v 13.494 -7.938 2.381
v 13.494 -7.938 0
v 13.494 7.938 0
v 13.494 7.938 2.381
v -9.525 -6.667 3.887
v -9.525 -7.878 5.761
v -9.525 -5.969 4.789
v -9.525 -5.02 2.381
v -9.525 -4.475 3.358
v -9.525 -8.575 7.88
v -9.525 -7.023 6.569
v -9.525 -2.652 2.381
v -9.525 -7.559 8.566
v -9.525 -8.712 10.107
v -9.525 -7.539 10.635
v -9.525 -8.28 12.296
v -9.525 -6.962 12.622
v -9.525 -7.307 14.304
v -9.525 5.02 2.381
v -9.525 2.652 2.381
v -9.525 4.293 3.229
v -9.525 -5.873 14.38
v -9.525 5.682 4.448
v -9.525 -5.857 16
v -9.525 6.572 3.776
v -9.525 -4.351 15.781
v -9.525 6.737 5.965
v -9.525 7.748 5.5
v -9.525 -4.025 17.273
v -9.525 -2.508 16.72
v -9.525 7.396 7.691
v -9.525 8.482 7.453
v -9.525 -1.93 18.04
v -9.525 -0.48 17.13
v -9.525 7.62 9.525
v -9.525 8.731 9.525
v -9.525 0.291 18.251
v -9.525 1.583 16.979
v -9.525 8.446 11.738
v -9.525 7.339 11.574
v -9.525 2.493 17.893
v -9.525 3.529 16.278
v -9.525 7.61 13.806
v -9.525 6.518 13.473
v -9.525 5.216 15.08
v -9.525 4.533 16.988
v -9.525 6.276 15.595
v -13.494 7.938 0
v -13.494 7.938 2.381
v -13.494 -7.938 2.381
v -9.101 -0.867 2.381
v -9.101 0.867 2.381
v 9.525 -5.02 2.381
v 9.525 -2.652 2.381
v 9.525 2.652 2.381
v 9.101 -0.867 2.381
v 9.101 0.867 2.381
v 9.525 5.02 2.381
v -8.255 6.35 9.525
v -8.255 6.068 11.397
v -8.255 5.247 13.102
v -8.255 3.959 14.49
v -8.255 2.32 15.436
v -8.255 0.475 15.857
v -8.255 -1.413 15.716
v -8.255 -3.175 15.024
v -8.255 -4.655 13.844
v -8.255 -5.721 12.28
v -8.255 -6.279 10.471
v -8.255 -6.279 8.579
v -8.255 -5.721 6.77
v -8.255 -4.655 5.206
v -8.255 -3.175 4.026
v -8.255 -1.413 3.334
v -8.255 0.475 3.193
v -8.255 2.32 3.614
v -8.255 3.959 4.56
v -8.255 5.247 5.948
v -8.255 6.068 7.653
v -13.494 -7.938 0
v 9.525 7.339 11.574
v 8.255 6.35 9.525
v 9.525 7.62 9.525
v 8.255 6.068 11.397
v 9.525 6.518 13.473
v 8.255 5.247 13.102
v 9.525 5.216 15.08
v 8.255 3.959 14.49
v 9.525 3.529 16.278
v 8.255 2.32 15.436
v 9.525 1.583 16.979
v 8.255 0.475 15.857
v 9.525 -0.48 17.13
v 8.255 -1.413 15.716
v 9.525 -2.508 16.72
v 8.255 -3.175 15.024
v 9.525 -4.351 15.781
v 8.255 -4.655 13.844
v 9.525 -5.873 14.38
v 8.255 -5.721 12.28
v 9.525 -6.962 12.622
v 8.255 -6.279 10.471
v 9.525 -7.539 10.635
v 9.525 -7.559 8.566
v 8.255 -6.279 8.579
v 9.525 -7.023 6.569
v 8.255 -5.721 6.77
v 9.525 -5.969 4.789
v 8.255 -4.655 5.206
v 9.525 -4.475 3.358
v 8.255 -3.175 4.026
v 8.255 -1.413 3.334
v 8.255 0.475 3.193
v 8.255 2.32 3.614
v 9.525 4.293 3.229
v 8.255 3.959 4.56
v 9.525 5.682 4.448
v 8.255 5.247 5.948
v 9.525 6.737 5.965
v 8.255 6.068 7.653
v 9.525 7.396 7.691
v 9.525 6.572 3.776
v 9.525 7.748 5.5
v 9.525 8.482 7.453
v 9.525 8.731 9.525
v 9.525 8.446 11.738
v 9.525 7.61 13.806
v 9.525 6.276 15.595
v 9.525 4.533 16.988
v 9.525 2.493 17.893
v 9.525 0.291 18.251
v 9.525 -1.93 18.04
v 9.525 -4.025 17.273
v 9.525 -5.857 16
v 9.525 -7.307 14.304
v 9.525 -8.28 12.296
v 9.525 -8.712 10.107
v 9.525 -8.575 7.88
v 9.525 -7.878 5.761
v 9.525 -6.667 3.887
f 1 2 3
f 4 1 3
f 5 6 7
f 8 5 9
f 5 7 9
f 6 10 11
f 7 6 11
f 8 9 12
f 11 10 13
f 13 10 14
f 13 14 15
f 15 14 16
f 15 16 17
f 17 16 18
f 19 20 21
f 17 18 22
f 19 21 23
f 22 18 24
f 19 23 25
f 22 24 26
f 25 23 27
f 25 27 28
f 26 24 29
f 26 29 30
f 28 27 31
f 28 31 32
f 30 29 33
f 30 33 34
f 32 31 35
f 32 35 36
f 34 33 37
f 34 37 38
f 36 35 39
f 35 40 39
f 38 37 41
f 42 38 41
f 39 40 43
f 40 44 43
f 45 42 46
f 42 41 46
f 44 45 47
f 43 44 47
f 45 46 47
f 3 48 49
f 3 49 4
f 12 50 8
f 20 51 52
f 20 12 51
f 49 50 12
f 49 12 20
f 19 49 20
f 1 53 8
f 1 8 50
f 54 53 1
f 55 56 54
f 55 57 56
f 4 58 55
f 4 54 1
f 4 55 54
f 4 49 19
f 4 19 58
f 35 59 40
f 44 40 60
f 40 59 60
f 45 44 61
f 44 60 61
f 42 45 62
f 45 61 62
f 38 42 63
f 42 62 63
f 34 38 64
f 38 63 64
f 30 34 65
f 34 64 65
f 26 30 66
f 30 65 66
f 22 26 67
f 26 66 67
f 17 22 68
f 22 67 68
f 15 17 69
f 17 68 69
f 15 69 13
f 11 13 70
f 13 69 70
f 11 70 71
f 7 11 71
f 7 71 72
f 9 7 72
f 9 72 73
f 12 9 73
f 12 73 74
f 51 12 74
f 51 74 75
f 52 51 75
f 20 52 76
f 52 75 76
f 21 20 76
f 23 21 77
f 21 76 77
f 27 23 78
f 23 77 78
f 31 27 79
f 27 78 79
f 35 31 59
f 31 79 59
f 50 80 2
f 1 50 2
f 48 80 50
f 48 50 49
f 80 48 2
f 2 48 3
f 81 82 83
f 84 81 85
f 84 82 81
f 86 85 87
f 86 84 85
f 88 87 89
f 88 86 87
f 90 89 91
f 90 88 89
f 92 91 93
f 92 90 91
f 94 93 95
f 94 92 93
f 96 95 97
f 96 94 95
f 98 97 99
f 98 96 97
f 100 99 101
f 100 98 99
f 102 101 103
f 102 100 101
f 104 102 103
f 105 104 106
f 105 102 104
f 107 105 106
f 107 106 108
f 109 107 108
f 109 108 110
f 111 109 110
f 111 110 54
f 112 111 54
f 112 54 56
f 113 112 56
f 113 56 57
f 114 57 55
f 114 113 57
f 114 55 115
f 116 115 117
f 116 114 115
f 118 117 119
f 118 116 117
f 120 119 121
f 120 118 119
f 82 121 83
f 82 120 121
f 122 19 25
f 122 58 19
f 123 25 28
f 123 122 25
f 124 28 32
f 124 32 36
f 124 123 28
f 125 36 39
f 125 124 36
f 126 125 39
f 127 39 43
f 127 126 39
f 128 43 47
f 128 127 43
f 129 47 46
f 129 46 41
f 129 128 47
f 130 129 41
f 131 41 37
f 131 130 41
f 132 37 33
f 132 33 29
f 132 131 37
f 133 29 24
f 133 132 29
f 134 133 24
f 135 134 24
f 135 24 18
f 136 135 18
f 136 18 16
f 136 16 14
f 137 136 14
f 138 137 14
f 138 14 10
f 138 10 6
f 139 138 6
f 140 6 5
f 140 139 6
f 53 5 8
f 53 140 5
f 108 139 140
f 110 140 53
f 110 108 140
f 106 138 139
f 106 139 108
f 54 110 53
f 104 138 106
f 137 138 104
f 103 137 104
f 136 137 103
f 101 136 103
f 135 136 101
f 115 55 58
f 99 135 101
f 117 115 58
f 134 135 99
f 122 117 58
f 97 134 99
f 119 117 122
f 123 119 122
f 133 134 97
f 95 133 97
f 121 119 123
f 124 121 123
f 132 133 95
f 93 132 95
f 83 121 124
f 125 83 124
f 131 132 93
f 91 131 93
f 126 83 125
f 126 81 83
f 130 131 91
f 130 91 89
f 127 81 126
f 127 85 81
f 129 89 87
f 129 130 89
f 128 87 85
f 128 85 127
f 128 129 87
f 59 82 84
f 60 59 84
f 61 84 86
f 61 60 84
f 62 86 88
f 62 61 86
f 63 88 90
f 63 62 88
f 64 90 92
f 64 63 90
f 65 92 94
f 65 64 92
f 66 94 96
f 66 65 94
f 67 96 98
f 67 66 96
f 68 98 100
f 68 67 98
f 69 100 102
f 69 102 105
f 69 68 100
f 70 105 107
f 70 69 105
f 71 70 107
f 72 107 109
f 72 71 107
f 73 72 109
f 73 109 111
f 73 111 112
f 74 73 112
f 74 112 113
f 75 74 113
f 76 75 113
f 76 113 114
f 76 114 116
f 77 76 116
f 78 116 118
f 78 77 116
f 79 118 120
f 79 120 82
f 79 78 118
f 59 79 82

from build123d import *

# Parameters (mm, degrees)
F0_W     = 26.9875
F0_H     = 15.875
F1_DEPTH = 2.38125
F2_R     = 6.35
F3_DEPTH = 9.525


# Not quite as in the source:
# - a fillet or chamfer that OpenCascade refuses, or shapes differently, is made with other operations: its cross-section is extruded or revolved along the edge and cut away or added


with BuildPart() as f1:
    # F0 (on Top) → F1 (new body)
    with BuildSketch(Plane.XY):
        Rectangle(F0_W, F0_H)
    extrude(amount=F1_DEPTH)

    # F2 (on Right) → F3 (join, symmetric)
    with BuildSketch(Plane.YZ):
        with BuildLine():
            ThreePointArc((5.0201157855, 2.38125), (7.7481163038, 5.4999012055), (8.73125, 9.525))
            ThreePointArc((8.73125, 9.525), (-4.0250987945, 17.2731163038), (-5.0201157855, 2.38125))
            Line((-5.0201157855, 2.38125), (5.0201157855, 2.38125))
        make_face()
        with Locations((0, 9.525)):
            Circle(F2_R, mode=Mode.SUBTRACT)
    extrude(amount=F3_DEPTH, both=True)

    # F4: chamfer of 1.27 on 2 edges, made by hand


with BuildPart() as f4_tool2:
    # F4_s3 → F4_t4 (revolve)
    with BuildSketch(Plane.XY.offset(9.525)):
        Polygon((9.525, 7.62), (8.255, 6.35), (9.525, 6.35), align=None)
    revolve(axis=Axis((9.525, 0, 9.525), (1, 0, 0)))

    split(bisect_by=Plane.XY.offset(2.38125), keep=Keep.TOP)


with BuildPart() as f1_1:
    add(f1.part)

    # F4_t1: cut F4_tool2
    add(f4_tool2.part, mode=Mode.SUBTRACT)


with BuildPart() as f4_tool7:
    # F4_s8 → F4_t9 (revolve)
    with BuildSketch(Plane.XY.offset(9.525)):
        Polygon((-9.525, 7.62), (-8.255, 6.35), (-9.525, 6.35), align=None)
    revolve(axis=Axis((-9.525, 0, 9.525), (1, 0, 0)))

    split(bisect_by=Plane.XY.offset(2.38125), keep=Keep.TOP)


with BuildPart() as f1_2:
    add(f1_1.part)

    # F4_t6: cut F4_tool7
    add(f4_tool7.part, mode=Mode.SUBTRACT)


solid = f1_2.part
